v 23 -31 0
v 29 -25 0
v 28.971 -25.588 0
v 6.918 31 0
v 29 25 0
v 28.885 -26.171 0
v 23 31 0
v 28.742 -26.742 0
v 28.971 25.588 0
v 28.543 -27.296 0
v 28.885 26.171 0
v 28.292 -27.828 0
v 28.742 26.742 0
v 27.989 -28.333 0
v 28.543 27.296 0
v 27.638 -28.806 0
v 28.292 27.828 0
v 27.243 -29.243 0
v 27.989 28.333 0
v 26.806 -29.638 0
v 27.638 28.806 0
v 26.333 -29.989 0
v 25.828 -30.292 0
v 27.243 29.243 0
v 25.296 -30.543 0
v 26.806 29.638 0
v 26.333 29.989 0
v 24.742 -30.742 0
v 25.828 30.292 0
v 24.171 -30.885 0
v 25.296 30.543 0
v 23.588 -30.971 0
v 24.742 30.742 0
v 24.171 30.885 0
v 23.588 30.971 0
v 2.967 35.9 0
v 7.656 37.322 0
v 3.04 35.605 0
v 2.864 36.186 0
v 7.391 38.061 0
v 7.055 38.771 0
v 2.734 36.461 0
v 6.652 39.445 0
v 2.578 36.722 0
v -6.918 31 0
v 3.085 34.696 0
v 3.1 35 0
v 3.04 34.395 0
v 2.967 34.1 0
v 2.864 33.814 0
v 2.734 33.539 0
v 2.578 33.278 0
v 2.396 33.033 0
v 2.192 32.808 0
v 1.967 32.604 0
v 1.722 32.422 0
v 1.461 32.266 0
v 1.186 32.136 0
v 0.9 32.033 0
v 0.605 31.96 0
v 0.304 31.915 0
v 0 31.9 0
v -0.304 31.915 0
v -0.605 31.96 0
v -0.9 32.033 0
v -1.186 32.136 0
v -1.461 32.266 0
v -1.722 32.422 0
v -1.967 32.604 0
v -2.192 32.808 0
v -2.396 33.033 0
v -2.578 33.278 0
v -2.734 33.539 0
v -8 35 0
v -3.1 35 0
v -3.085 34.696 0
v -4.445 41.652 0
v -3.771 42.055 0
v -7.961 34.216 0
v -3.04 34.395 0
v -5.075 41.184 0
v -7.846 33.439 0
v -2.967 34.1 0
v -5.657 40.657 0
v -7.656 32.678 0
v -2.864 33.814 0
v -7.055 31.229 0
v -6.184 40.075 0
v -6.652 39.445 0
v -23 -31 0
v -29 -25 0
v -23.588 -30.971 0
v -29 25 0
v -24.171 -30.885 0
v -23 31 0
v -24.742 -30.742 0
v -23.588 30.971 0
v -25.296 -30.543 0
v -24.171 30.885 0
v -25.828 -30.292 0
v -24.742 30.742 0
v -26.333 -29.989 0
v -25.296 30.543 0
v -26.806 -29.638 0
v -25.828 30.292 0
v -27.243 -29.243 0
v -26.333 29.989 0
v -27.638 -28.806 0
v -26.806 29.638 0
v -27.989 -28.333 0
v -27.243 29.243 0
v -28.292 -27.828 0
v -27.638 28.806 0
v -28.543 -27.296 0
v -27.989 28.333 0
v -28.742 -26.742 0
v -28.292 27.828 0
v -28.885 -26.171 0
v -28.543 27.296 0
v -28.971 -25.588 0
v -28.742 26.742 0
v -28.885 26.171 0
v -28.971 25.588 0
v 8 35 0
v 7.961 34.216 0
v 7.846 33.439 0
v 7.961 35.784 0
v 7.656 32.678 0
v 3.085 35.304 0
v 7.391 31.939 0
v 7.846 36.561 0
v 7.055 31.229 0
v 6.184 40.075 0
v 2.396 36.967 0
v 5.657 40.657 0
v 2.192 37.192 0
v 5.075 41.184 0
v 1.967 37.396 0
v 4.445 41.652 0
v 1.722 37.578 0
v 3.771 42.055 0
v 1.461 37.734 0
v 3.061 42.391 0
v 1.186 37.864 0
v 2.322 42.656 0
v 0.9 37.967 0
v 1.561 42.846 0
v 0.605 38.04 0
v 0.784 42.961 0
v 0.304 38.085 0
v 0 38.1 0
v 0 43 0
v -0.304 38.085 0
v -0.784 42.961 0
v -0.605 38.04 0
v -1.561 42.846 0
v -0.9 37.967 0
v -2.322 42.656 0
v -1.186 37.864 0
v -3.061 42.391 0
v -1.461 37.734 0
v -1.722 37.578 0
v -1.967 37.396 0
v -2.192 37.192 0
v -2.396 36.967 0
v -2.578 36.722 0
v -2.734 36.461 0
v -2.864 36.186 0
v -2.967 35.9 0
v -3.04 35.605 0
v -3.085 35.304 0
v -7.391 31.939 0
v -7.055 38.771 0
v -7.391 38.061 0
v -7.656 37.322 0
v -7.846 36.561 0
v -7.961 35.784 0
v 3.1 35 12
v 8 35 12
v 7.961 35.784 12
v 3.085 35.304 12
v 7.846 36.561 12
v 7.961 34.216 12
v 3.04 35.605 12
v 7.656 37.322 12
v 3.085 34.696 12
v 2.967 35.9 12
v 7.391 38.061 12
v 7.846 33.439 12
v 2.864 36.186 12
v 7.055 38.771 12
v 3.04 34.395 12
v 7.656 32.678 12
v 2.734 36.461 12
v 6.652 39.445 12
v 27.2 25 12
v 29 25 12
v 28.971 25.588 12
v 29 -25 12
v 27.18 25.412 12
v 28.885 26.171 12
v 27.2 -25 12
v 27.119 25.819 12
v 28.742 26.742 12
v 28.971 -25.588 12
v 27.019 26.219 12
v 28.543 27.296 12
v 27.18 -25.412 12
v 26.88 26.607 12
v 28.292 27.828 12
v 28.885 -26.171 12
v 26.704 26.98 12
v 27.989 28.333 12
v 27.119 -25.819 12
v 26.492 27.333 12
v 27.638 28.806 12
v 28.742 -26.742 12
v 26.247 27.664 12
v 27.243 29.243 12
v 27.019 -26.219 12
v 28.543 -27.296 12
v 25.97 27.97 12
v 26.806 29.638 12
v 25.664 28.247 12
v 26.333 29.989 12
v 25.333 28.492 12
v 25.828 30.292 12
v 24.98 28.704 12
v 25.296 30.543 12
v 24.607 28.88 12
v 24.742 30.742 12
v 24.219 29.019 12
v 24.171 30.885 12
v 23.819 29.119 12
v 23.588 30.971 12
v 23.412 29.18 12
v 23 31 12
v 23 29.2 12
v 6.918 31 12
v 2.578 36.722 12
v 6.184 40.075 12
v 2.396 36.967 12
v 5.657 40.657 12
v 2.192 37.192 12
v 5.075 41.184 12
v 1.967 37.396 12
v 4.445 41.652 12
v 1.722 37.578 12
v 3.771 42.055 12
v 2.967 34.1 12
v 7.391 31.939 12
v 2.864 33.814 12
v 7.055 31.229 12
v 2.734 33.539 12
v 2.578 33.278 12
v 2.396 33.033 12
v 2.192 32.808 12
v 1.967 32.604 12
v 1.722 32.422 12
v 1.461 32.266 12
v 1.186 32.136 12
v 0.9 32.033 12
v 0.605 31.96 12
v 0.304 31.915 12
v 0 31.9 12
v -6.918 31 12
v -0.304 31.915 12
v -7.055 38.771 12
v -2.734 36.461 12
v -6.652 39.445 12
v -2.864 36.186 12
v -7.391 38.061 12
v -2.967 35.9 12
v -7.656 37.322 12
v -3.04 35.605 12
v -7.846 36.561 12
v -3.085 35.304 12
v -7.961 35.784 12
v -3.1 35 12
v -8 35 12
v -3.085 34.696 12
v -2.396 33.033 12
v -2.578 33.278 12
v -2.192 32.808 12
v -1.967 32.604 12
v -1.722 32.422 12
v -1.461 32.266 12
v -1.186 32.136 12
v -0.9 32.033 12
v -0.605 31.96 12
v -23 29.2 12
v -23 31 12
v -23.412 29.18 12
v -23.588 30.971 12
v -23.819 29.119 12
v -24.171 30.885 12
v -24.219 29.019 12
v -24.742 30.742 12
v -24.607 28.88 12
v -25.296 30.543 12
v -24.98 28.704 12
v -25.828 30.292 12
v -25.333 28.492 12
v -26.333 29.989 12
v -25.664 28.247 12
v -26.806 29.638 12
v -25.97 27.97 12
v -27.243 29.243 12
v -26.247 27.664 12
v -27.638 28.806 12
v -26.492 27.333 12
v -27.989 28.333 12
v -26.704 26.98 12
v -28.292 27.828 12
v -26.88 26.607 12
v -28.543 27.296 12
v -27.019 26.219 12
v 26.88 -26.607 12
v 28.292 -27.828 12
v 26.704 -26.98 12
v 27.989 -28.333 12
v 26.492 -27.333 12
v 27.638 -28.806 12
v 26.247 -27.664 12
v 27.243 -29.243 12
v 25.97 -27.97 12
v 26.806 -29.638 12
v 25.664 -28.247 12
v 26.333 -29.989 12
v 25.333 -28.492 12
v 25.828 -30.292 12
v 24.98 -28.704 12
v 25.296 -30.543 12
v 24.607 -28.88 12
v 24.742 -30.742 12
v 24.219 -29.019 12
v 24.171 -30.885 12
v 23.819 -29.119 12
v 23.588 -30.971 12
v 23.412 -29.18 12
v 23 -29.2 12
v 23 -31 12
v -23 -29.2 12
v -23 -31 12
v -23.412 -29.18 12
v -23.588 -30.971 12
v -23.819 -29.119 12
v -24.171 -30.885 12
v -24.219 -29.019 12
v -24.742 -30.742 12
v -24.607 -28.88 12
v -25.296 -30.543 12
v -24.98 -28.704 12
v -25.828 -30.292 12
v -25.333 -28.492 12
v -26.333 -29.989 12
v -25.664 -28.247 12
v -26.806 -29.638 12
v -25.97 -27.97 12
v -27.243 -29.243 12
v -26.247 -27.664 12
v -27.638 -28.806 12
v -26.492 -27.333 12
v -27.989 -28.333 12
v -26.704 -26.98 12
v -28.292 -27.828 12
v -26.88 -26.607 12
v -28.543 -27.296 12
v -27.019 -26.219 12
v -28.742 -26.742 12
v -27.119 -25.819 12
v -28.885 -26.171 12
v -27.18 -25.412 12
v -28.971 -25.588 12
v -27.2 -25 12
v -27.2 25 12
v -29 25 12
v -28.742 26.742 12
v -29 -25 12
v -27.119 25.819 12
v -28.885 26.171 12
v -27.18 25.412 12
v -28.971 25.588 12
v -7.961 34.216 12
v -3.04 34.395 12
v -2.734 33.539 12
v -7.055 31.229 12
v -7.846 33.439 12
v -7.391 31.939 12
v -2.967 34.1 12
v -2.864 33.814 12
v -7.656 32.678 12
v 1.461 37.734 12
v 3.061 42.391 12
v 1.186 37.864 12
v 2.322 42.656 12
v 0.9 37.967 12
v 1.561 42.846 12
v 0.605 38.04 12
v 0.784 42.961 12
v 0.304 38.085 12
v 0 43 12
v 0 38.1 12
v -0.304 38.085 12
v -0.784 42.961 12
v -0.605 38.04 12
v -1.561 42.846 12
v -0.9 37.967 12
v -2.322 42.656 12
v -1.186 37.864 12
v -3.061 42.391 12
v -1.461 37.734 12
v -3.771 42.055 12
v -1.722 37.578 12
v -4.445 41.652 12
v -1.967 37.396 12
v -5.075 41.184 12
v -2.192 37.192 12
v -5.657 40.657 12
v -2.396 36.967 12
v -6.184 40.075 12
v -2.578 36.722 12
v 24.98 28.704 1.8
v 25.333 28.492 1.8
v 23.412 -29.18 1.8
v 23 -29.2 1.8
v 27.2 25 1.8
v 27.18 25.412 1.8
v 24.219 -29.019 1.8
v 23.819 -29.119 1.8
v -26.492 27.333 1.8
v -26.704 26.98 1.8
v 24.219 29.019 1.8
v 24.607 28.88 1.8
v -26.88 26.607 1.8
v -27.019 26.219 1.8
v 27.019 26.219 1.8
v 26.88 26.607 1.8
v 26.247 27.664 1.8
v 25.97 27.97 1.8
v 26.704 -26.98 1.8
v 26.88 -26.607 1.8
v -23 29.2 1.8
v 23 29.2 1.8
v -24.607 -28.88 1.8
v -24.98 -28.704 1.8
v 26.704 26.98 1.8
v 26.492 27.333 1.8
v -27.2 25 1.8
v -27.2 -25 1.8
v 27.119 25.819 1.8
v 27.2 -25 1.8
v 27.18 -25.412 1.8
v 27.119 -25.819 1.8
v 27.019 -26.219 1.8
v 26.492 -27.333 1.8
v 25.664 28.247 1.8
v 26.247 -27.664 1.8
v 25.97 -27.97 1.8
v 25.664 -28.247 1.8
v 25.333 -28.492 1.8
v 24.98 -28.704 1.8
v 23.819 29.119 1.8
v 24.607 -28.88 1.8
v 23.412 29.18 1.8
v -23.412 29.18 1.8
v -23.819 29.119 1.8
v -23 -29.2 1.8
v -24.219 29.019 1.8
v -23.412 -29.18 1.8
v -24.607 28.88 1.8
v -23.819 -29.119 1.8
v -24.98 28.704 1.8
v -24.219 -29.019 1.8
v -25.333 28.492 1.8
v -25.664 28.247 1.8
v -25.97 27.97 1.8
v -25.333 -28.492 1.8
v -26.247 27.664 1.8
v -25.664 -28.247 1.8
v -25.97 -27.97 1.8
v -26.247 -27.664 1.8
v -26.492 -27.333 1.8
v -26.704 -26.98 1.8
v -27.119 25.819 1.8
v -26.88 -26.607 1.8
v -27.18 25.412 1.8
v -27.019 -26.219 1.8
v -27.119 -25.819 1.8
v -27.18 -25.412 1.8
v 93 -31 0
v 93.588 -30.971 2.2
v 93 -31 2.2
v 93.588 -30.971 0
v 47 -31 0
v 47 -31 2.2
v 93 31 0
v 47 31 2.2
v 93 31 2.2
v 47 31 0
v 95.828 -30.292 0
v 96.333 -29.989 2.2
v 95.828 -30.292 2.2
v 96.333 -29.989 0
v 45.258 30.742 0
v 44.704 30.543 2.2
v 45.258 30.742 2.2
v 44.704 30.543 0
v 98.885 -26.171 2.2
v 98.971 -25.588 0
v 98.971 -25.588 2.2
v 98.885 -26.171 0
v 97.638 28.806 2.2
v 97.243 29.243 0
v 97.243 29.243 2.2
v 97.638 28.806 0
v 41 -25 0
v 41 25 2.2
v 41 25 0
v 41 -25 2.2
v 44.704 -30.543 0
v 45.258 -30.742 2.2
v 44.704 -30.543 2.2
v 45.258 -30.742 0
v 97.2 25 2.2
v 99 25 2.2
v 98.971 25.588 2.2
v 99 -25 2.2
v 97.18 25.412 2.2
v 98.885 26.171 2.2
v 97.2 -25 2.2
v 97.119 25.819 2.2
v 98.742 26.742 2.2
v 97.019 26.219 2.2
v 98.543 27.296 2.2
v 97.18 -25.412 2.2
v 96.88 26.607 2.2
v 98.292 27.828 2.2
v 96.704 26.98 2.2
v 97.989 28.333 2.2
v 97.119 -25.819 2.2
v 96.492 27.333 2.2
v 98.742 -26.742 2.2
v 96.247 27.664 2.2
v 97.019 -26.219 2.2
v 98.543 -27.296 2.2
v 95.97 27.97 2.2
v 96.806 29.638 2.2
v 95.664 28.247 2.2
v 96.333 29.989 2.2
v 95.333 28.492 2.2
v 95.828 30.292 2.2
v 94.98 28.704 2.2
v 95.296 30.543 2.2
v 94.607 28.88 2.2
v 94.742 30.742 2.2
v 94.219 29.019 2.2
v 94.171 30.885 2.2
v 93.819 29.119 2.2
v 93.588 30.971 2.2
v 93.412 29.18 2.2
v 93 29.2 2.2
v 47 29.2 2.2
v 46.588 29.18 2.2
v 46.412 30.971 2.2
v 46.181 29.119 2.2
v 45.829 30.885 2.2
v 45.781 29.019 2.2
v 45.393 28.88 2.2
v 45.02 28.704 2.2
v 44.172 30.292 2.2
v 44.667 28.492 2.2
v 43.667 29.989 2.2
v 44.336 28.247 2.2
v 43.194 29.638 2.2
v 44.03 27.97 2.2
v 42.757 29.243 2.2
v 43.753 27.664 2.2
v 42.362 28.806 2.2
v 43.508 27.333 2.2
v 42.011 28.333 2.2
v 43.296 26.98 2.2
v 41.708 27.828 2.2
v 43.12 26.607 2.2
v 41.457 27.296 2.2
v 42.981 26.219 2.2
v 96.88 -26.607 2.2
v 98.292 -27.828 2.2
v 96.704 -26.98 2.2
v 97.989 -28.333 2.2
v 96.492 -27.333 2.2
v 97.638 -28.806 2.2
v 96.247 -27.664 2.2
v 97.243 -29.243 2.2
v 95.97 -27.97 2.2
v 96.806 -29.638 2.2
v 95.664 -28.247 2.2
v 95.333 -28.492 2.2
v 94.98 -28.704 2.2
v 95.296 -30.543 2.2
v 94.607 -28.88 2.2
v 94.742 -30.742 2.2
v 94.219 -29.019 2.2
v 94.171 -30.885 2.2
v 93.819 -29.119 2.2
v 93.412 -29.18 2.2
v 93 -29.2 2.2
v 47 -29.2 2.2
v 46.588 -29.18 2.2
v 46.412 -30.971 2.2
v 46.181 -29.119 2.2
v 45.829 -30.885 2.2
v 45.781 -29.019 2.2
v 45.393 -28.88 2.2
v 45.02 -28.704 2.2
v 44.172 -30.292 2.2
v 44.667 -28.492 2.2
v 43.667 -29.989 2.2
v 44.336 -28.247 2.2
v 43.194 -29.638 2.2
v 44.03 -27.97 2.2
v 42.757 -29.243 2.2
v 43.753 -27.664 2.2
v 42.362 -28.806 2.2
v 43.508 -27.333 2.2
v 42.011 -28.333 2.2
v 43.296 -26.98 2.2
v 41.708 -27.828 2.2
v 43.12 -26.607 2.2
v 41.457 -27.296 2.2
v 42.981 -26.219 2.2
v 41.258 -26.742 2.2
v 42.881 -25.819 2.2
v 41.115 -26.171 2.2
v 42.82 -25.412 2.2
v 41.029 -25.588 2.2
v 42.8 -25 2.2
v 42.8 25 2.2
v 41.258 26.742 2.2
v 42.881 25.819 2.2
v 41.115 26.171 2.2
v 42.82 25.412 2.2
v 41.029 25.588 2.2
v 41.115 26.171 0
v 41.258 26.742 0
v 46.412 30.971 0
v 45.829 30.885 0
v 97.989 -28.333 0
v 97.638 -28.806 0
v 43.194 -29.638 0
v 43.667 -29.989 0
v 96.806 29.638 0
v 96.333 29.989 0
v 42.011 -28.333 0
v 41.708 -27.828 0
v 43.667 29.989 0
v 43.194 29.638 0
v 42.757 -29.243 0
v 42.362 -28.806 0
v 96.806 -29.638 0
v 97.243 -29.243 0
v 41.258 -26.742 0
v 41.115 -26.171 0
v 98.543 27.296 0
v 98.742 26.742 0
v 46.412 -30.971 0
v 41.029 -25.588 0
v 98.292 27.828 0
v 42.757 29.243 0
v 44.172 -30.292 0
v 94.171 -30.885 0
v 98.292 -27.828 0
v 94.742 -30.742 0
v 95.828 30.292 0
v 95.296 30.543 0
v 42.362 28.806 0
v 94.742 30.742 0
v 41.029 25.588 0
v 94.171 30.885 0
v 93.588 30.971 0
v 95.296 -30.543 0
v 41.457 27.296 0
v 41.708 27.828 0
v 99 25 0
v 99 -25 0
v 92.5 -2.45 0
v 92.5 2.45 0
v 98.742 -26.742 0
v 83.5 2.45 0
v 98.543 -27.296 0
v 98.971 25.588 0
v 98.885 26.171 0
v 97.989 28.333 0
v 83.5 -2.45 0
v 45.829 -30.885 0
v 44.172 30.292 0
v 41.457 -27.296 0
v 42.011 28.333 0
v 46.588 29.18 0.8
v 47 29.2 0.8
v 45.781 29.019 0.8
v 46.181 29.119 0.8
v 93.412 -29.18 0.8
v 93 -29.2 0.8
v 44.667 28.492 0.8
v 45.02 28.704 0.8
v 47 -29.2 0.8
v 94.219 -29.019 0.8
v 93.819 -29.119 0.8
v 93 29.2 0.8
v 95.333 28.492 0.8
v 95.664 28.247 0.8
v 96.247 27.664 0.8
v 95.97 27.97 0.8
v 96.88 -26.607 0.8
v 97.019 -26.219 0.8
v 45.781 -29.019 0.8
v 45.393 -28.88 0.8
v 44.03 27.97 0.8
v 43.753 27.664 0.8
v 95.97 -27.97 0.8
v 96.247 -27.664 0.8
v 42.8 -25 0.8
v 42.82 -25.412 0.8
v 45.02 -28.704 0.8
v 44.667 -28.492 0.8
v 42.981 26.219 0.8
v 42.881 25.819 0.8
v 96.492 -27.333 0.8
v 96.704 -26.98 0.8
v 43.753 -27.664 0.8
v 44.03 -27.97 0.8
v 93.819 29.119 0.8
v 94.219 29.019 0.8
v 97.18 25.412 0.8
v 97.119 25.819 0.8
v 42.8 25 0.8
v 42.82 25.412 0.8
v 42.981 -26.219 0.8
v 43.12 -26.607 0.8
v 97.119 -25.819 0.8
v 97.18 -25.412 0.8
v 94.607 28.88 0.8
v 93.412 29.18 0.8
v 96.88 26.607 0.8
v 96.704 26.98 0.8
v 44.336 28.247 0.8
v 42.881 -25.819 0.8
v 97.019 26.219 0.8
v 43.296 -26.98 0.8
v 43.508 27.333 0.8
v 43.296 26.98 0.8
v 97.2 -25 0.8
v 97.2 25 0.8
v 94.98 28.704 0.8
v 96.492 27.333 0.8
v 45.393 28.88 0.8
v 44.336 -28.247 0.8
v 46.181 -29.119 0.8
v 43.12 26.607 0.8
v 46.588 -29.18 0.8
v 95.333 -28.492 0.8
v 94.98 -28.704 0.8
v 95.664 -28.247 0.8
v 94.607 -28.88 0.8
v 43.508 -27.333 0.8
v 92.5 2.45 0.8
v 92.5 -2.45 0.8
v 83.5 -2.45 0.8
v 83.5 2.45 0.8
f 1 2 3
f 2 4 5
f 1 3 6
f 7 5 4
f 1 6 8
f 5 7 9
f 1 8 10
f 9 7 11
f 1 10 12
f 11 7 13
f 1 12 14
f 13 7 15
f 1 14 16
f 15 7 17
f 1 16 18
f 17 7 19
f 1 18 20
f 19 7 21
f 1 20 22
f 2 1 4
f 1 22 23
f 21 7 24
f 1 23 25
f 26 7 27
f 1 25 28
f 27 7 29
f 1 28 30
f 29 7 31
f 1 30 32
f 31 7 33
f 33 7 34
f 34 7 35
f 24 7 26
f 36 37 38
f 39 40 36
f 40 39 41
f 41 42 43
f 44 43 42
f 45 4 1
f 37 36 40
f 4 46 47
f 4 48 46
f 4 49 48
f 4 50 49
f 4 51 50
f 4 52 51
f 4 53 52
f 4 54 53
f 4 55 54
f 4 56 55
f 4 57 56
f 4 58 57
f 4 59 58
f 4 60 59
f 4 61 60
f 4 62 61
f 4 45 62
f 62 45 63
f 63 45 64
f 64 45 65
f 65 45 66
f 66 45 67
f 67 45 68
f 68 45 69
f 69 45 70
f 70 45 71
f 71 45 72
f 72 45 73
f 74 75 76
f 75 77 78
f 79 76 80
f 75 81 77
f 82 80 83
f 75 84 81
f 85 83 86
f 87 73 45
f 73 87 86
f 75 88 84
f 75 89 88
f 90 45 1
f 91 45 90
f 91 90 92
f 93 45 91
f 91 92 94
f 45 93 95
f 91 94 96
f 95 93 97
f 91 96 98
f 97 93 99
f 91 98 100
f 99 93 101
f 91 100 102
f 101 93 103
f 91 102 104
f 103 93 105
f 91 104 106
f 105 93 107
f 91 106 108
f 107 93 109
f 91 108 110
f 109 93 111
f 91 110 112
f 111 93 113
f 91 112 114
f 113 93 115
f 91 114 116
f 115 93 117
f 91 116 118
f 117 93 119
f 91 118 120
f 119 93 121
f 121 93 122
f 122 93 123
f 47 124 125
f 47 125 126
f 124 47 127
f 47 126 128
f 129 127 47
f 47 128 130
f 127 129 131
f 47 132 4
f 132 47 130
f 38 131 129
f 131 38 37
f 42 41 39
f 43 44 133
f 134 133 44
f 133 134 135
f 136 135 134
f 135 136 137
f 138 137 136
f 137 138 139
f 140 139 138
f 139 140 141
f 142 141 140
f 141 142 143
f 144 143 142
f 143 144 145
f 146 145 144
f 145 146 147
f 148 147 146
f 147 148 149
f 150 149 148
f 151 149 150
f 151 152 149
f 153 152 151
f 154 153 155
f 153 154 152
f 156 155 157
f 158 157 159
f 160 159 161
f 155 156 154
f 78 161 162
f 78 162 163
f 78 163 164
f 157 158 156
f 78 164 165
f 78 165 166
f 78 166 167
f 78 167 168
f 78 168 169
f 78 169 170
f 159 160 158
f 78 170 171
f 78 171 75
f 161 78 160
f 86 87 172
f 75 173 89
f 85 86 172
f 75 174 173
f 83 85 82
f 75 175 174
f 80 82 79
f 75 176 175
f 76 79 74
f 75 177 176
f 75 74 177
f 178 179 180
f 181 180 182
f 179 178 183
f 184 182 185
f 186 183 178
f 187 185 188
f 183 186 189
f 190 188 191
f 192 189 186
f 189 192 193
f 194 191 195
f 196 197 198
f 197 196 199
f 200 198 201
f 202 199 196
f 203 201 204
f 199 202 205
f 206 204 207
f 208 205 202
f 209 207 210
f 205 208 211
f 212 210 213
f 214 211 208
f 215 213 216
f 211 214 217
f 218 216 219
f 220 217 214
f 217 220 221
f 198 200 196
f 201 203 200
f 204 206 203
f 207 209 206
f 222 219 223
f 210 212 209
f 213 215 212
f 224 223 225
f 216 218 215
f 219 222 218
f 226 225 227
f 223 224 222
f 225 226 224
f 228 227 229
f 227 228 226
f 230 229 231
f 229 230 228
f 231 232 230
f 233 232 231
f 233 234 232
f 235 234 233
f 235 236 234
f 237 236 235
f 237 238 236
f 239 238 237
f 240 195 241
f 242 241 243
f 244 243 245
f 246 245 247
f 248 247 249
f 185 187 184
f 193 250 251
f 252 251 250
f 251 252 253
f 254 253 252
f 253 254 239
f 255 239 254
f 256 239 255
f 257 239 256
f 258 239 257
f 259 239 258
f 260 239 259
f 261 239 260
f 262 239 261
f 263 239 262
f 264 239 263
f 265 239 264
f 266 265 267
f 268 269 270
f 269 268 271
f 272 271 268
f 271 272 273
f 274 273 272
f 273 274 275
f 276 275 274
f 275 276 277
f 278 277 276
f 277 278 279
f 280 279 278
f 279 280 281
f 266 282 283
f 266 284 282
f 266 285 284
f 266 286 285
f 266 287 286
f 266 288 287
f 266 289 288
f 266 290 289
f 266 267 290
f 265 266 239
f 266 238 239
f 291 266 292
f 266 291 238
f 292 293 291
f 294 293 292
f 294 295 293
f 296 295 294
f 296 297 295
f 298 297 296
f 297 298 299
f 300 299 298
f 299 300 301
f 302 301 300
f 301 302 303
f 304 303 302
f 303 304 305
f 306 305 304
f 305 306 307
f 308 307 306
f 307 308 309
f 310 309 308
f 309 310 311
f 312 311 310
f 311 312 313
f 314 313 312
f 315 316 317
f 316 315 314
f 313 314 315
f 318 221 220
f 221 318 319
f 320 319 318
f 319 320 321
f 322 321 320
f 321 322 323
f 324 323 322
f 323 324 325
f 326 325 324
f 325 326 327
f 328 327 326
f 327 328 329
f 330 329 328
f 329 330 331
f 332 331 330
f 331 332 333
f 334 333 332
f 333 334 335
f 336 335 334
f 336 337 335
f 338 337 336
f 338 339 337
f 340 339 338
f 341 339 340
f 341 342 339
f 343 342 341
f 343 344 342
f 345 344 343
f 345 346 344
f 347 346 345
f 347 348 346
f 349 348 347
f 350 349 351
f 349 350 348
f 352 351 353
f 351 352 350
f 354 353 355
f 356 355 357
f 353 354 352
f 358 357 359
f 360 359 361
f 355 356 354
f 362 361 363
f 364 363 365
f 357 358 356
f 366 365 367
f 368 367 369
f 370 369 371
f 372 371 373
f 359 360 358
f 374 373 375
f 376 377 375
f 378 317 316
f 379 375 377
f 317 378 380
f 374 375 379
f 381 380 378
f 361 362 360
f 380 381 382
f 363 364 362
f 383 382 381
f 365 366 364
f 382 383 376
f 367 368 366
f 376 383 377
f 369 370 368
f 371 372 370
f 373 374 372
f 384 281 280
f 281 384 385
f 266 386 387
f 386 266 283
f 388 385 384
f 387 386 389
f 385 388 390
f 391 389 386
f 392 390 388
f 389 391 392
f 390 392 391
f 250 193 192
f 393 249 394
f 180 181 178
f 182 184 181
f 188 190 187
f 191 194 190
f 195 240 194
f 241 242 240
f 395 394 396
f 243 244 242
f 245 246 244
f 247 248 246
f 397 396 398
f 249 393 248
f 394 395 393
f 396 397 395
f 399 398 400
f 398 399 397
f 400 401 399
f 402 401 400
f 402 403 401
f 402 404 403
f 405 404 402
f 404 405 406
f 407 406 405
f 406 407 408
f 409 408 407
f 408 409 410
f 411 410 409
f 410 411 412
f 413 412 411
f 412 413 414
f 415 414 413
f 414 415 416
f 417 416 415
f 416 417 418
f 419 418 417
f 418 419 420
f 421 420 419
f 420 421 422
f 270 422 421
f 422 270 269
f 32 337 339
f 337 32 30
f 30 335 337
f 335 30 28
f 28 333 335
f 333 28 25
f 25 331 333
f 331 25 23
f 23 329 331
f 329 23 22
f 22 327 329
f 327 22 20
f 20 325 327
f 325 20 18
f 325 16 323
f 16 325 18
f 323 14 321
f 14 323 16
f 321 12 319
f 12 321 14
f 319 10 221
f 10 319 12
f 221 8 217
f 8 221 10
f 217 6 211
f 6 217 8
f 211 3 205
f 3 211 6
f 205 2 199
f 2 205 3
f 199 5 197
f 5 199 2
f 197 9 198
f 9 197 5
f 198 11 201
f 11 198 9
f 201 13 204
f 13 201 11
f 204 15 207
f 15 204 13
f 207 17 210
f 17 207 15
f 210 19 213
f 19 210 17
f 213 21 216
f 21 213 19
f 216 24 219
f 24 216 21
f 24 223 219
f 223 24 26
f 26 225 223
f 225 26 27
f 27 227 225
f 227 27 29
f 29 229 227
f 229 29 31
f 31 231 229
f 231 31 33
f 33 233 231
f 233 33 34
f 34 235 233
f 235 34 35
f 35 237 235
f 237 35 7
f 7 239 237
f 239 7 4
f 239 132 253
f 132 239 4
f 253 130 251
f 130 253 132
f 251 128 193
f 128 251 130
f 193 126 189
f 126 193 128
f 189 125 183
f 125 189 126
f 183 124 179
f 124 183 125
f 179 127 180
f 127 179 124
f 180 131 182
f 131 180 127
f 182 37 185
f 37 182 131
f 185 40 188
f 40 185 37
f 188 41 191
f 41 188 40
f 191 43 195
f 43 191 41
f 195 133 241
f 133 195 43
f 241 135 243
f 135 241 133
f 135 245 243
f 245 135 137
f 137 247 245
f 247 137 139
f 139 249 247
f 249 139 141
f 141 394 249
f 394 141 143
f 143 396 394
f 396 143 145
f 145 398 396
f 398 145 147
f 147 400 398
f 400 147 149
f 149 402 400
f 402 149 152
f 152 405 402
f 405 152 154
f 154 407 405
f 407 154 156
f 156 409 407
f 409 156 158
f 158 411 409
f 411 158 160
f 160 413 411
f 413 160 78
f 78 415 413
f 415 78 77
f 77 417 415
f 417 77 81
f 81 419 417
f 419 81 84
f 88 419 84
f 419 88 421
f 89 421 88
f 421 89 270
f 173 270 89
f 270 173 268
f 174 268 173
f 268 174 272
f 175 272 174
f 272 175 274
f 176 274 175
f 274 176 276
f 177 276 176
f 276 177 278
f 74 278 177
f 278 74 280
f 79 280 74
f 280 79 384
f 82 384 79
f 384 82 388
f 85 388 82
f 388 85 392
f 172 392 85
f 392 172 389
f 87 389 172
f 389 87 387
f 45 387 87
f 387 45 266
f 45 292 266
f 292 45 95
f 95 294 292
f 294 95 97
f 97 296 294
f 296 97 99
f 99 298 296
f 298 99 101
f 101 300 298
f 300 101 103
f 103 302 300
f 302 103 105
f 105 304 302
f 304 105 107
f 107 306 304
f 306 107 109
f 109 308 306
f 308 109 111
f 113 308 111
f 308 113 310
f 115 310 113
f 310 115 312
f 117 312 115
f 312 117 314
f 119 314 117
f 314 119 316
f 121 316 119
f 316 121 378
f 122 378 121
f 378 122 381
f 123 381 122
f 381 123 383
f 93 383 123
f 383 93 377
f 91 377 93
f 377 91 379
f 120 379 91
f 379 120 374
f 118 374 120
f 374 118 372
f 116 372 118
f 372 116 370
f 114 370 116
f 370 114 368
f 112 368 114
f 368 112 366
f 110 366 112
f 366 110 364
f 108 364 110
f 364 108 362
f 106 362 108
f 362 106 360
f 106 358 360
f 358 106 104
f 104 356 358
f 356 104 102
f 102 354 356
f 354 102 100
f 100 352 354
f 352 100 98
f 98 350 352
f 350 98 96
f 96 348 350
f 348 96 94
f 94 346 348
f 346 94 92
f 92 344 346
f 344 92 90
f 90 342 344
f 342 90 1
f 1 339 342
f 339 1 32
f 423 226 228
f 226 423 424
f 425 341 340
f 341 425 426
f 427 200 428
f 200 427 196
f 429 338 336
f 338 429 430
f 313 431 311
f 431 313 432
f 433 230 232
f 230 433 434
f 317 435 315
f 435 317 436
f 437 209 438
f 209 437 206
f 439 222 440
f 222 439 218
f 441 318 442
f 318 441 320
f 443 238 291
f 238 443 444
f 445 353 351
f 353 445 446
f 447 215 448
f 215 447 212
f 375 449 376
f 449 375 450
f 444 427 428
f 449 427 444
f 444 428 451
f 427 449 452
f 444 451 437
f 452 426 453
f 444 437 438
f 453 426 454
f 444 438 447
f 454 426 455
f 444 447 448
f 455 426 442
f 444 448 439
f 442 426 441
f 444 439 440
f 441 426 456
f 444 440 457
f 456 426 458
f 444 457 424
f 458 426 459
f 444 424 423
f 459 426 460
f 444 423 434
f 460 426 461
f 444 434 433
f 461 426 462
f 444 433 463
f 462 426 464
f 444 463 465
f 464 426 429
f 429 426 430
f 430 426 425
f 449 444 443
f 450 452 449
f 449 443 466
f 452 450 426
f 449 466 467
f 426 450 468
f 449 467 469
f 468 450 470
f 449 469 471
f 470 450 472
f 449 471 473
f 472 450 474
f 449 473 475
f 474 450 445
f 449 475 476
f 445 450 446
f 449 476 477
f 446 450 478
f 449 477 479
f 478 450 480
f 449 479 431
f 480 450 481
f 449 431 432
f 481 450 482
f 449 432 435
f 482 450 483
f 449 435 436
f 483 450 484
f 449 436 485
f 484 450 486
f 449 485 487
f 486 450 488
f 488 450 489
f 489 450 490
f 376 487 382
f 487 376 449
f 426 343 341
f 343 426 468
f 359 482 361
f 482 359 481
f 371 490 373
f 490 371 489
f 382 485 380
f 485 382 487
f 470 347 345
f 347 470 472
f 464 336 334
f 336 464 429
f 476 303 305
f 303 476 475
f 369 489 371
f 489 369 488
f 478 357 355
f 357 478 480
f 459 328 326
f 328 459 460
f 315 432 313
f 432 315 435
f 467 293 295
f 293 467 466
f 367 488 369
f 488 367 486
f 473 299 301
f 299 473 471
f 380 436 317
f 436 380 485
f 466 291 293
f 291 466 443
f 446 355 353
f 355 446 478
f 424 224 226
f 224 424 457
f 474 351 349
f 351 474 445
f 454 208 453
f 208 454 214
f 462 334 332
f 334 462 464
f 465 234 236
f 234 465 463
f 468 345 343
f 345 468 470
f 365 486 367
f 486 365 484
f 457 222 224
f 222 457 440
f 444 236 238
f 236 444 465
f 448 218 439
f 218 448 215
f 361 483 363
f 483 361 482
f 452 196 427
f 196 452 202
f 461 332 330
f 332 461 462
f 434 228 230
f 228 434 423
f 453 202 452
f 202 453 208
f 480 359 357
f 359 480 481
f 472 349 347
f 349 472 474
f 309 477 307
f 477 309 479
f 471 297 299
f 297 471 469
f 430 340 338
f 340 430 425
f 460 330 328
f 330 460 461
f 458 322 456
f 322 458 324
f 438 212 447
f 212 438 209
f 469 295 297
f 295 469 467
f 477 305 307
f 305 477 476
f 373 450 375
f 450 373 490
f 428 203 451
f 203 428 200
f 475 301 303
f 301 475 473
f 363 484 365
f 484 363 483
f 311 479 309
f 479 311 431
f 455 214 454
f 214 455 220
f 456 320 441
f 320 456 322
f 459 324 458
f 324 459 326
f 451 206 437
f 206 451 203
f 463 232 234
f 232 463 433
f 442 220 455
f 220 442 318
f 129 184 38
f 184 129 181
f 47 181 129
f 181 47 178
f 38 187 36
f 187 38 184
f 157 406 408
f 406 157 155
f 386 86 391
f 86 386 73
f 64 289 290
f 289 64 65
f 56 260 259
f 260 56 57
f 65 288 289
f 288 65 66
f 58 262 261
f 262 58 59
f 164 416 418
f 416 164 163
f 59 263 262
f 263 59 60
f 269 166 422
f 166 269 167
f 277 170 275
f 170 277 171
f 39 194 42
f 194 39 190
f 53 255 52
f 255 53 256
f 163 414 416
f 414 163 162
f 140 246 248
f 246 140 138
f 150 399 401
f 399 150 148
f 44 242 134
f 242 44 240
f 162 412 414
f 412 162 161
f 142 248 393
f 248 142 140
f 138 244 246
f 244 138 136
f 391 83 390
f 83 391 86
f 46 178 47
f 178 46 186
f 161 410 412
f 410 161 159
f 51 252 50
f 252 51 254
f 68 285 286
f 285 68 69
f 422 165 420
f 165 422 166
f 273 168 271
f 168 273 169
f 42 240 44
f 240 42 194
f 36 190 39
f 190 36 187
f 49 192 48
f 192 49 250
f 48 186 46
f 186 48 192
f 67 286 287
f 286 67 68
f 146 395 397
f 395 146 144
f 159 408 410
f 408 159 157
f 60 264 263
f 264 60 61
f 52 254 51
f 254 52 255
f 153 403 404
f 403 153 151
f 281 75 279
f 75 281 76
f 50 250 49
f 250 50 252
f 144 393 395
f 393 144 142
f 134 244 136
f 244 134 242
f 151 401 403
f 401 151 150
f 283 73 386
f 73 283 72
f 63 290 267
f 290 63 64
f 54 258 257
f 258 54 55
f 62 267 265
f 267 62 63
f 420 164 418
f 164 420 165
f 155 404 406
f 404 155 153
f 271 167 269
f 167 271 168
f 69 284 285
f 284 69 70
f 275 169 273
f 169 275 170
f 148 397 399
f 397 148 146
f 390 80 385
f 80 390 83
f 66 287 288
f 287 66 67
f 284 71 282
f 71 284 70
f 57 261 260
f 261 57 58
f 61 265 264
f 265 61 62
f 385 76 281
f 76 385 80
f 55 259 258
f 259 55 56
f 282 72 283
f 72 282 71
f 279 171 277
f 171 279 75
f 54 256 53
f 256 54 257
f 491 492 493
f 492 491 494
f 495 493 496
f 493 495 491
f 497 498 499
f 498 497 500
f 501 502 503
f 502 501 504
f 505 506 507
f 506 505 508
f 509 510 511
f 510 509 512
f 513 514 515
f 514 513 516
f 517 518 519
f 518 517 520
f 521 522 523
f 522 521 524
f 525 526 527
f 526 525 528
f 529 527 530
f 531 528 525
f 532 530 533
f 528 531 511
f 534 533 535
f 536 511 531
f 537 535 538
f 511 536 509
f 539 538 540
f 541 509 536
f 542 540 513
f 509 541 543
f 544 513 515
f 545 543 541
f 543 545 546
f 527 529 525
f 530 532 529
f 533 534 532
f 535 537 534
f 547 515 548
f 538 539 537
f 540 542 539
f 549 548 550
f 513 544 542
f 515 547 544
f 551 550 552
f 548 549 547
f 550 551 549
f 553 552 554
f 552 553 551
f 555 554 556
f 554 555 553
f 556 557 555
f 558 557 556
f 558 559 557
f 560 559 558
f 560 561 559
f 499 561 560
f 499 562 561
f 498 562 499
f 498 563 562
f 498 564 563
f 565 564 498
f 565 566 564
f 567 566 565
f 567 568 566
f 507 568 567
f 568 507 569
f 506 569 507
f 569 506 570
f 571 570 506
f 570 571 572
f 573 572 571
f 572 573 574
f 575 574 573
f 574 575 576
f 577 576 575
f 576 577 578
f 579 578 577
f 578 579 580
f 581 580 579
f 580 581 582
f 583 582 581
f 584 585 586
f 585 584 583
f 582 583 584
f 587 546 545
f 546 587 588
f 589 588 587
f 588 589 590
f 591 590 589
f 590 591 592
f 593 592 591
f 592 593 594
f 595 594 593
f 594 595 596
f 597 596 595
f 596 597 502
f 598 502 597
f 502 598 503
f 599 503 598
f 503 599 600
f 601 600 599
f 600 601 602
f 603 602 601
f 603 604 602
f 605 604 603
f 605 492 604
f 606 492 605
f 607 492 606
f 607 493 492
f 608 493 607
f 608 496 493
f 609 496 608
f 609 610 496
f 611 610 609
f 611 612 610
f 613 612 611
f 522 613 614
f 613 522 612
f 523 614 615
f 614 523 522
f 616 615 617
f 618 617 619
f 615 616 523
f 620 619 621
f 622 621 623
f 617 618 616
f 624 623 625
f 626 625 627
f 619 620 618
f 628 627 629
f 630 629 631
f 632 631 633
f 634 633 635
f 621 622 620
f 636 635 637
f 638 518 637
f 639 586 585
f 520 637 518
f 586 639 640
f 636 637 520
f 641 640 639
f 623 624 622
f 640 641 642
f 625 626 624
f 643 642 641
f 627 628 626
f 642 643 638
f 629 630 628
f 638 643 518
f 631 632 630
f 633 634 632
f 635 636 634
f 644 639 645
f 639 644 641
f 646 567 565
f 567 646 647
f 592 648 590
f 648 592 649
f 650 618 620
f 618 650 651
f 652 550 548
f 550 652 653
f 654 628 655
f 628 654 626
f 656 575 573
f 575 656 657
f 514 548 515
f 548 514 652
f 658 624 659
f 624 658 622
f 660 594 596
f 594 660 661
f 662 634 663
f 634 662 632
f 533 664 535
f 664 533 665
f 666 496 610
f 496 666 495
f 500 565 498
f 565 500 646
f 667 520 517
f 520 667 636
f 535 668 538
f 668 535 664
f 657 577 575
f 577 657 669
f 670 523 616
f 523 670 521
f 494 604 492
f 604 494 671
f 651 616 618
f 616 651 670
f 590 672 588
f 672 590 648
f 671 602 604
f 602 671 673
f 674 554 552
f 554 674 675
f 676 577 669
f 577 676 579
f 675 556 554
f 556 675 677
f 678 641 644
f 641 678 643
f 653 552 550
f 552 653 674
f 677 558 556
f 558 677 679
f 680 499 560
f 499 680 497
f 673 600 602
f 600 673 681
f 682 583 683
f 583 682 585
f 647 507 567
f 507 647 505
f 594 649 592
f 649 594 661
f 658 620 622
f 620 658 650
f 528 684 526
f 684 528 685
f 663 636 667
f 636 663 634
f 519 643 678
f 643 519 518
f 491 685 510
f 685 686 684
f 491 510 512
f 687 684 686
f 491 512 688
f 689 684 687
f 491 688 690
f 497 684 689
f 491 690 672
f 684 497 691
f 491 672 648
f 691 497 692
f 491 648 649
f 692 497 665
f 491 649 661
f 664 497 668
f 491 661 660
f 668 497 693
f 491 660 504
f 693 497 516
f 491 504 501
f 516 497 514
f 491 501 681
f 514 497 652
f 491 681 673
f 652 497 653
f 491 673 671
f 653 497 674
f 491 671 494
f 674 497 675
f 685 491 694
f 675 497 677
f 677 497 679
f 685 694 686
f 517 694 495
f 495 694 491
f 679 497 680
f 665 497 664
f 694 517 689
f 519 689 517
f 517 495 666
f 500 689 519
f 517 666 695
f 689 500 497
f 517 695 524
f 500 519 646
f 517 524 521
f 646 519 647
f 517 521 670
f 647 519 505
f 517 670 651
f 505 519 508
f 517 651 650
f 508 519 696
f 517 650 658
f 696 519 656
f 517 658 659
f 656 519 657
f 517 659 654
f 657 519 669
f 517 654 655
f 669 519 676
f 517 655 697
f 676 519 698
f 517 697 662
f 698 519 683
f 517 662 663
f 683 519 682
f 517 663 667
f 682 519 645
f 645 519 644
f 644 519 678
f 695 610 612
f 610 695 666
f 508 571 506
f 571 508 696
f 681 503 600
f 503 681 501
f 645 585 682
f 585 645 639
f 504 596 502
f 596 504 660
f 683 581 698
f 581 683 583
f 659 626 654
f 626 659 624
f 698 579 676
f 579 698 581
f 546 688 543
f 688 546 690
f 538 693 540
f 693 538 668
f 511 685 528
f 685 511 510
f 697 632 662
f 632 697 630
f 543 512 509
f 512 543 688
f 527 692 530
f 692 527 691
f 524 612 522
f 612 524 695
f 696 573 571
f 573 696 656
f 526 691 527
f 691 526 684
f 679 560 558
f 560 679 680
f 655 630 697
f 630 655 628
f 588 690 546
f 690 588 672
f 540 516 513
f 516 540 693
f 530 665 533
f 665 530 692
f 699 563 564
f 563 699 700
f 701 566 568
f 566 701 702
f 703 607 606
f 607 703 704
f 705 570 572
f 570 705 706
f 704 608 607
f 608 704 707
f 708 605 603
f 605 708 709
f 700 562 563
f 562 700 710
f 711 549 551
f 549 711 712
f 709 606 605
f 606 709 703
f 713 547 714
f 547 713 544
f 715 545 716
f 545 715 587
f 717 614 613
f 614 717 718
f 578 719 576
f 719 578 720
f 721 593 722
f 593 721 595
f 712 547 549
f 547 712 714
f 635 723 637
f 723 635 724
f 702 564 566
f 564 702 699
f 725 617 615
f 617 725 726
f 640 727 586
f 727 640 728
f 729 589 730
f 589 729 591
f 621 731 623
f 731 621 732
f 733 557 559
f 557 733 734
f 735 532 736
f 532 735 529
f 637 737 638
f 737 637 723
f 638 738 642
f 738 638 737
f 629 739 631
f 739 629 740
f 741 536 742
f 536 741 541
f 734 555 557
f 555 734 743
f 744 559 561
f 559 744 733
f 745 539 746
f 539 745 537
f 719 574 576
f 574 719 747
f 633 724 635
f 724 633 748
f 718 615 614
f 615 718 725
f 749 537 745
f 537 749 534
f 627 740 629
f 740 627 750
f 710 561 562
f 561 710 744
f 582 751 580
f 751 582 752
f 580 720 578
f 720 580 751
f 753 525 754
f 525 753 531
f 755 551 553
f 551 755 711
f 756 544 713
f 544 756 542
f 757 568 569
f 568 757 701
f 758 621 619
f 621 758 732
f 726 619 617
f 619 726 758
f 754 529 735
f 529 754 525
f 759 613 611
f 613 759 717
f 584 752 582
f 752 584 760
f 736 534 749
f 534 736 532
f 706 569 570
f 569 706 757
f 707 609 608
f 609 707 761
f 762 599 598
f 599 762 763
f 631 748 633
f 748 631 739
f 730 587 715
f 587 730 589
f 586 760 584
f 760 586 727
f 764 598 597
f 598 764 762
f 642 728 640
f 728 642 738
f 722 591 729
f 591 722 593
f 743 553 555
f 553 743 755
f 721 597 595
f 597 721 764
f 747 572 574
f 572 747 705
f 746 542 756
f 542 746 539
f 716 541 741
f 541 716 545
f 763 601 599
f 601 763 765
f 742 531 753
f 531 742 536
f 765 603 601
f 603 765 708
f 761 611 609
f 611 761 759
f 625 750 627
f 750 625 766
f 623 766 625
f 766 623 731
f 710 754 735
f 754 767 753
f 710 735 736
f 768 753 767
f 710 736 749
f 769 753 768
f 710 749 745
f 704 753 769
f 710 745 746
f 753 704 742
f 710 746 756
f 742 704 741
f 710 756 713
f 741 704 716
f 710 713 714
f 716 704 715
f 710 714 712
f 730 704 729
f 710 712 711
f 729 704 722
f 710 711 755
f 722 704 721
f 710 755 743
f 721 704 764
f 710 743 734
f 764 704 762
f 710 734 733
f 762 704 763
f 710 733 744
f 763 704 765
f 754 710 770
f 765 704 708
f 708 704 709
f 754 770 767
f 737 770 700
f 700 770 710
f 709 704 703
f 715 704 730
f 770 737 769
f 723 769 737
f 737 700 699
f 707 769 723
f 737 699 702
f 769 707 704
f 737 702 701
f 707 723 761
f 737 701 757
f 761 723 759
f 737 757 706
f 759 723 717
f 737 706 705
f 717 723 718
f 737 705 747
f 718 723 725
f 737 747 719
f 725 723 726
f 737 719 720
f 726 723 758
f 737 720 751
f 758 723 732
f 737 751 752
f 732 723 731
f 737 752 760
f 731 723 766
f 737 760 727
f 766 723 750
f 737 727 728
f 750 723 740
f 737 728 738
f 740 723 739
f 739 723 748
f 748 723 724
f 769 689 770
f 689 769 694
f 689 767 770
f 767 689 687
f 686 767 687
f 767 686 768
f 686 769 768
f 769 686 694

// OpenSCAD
// Direct-view OLED keychain case concept
// Revised for a compact keychain with a large OLED front window,
// a battery cavity, and a slim rear cover.
// Units: millimetres

$fn = 64;
part = "both"; // "body", "cover", or "both"

tol = 0.5;                // general fit tolerance
wall = 1.8;
front_thick = 1.6;
cover_thick = 2.2;
case_thick = 12;
corner_r = 6;

case_w = 58;
case_h = 62;
case_d = 12;

window_w = 34;
window_h = 18;
window_y = 4;             // move window upward in the body

switch_slot_w = 7.5;
switch_slot_h = 3.4;
switch_pos_x = 18;

loop_outer_d = 16;
loop_hole_d = 6.2;
loop_offset_y = case_h/2 + 4;

battery_w = 30;
battery_h = 46;
battery_t = 6.5;

module rounded_rect(size_x, size_y, r) {
    offset(r = r)
        square([size_x - 2*r, size_y - 2*r], center = true);
}

module body_outline() {
    union() {
        rounded_rect(case_w, case_h, corner_r);
        translate([0, loop_offset_y, 0])
            circle(d = loop_outer_d);
    }
}

module body() {
    difference() {
        // outer shell
        linear_extrude(height = case_d)
            body_outline();

        // main internal cavity (keeps wall thickness around the edges)
        translate([0, 0, wall])
            linear_extrude(height = case_d - wall + 0.2)
                rounded_rect(case_w - 2*wall,
                             case_h - 2*wall,
                             max(2, corner_r - wall));

        // front OLED aperture
        translate([0, window_y, case_d - front_thick])
            linear_extrude(height = front_thick + 0.5)
                rounded_rect(window_w + tol, window_h + tol, 2.2);

        // switch slot at the side of the case
        translate([switch_pos_x, 0, case_d - front_thick])
            linear_extrude(height = front_thick + 0.5)
                square([switch_slot_w, switch_slot_h], center = true);

        // keyring hole
        translate([0, loop_offset_y, -0.1])
            cylinder(d = loop_hole_d, h = case_d + 0.2);

        // simple internal clearance for a thin PCB - only rough placeholder
        translate([0, -4, wall + 0.9])
            linear_extrude(height = 2.4)
                rounded_rect(40, 28, 3);
    }
}

module cover() {
    difference() {
        linear_extrude(height = cover_thick)
            rounded_rect(case_w, case_h, corner_r);

        // inner recess so cover sits over shell body
        translate([0, 0, 0.8])
            linear_extrude(height = cover_thick)
                rounded_rect(case_w - 2*wall,
                             case_h - 2*wall,
                             max(2, corner_r - wall));

        // small hole for the switch actuator on the rear cover (optional)
        translate([switch_pos_x, 0, -0.1])
            linear_extrude(height = cover_thick + 0.2)
                square([switch_slot_w + 1.5, switch_slot_h + 1.5], center = true);
    }
}

if (part == "body") {
    body();
}
else if (part == "cover") {
    cover();
}
else {
    body();
    translate([case_w + 12, 0, 0]) cover();
}
